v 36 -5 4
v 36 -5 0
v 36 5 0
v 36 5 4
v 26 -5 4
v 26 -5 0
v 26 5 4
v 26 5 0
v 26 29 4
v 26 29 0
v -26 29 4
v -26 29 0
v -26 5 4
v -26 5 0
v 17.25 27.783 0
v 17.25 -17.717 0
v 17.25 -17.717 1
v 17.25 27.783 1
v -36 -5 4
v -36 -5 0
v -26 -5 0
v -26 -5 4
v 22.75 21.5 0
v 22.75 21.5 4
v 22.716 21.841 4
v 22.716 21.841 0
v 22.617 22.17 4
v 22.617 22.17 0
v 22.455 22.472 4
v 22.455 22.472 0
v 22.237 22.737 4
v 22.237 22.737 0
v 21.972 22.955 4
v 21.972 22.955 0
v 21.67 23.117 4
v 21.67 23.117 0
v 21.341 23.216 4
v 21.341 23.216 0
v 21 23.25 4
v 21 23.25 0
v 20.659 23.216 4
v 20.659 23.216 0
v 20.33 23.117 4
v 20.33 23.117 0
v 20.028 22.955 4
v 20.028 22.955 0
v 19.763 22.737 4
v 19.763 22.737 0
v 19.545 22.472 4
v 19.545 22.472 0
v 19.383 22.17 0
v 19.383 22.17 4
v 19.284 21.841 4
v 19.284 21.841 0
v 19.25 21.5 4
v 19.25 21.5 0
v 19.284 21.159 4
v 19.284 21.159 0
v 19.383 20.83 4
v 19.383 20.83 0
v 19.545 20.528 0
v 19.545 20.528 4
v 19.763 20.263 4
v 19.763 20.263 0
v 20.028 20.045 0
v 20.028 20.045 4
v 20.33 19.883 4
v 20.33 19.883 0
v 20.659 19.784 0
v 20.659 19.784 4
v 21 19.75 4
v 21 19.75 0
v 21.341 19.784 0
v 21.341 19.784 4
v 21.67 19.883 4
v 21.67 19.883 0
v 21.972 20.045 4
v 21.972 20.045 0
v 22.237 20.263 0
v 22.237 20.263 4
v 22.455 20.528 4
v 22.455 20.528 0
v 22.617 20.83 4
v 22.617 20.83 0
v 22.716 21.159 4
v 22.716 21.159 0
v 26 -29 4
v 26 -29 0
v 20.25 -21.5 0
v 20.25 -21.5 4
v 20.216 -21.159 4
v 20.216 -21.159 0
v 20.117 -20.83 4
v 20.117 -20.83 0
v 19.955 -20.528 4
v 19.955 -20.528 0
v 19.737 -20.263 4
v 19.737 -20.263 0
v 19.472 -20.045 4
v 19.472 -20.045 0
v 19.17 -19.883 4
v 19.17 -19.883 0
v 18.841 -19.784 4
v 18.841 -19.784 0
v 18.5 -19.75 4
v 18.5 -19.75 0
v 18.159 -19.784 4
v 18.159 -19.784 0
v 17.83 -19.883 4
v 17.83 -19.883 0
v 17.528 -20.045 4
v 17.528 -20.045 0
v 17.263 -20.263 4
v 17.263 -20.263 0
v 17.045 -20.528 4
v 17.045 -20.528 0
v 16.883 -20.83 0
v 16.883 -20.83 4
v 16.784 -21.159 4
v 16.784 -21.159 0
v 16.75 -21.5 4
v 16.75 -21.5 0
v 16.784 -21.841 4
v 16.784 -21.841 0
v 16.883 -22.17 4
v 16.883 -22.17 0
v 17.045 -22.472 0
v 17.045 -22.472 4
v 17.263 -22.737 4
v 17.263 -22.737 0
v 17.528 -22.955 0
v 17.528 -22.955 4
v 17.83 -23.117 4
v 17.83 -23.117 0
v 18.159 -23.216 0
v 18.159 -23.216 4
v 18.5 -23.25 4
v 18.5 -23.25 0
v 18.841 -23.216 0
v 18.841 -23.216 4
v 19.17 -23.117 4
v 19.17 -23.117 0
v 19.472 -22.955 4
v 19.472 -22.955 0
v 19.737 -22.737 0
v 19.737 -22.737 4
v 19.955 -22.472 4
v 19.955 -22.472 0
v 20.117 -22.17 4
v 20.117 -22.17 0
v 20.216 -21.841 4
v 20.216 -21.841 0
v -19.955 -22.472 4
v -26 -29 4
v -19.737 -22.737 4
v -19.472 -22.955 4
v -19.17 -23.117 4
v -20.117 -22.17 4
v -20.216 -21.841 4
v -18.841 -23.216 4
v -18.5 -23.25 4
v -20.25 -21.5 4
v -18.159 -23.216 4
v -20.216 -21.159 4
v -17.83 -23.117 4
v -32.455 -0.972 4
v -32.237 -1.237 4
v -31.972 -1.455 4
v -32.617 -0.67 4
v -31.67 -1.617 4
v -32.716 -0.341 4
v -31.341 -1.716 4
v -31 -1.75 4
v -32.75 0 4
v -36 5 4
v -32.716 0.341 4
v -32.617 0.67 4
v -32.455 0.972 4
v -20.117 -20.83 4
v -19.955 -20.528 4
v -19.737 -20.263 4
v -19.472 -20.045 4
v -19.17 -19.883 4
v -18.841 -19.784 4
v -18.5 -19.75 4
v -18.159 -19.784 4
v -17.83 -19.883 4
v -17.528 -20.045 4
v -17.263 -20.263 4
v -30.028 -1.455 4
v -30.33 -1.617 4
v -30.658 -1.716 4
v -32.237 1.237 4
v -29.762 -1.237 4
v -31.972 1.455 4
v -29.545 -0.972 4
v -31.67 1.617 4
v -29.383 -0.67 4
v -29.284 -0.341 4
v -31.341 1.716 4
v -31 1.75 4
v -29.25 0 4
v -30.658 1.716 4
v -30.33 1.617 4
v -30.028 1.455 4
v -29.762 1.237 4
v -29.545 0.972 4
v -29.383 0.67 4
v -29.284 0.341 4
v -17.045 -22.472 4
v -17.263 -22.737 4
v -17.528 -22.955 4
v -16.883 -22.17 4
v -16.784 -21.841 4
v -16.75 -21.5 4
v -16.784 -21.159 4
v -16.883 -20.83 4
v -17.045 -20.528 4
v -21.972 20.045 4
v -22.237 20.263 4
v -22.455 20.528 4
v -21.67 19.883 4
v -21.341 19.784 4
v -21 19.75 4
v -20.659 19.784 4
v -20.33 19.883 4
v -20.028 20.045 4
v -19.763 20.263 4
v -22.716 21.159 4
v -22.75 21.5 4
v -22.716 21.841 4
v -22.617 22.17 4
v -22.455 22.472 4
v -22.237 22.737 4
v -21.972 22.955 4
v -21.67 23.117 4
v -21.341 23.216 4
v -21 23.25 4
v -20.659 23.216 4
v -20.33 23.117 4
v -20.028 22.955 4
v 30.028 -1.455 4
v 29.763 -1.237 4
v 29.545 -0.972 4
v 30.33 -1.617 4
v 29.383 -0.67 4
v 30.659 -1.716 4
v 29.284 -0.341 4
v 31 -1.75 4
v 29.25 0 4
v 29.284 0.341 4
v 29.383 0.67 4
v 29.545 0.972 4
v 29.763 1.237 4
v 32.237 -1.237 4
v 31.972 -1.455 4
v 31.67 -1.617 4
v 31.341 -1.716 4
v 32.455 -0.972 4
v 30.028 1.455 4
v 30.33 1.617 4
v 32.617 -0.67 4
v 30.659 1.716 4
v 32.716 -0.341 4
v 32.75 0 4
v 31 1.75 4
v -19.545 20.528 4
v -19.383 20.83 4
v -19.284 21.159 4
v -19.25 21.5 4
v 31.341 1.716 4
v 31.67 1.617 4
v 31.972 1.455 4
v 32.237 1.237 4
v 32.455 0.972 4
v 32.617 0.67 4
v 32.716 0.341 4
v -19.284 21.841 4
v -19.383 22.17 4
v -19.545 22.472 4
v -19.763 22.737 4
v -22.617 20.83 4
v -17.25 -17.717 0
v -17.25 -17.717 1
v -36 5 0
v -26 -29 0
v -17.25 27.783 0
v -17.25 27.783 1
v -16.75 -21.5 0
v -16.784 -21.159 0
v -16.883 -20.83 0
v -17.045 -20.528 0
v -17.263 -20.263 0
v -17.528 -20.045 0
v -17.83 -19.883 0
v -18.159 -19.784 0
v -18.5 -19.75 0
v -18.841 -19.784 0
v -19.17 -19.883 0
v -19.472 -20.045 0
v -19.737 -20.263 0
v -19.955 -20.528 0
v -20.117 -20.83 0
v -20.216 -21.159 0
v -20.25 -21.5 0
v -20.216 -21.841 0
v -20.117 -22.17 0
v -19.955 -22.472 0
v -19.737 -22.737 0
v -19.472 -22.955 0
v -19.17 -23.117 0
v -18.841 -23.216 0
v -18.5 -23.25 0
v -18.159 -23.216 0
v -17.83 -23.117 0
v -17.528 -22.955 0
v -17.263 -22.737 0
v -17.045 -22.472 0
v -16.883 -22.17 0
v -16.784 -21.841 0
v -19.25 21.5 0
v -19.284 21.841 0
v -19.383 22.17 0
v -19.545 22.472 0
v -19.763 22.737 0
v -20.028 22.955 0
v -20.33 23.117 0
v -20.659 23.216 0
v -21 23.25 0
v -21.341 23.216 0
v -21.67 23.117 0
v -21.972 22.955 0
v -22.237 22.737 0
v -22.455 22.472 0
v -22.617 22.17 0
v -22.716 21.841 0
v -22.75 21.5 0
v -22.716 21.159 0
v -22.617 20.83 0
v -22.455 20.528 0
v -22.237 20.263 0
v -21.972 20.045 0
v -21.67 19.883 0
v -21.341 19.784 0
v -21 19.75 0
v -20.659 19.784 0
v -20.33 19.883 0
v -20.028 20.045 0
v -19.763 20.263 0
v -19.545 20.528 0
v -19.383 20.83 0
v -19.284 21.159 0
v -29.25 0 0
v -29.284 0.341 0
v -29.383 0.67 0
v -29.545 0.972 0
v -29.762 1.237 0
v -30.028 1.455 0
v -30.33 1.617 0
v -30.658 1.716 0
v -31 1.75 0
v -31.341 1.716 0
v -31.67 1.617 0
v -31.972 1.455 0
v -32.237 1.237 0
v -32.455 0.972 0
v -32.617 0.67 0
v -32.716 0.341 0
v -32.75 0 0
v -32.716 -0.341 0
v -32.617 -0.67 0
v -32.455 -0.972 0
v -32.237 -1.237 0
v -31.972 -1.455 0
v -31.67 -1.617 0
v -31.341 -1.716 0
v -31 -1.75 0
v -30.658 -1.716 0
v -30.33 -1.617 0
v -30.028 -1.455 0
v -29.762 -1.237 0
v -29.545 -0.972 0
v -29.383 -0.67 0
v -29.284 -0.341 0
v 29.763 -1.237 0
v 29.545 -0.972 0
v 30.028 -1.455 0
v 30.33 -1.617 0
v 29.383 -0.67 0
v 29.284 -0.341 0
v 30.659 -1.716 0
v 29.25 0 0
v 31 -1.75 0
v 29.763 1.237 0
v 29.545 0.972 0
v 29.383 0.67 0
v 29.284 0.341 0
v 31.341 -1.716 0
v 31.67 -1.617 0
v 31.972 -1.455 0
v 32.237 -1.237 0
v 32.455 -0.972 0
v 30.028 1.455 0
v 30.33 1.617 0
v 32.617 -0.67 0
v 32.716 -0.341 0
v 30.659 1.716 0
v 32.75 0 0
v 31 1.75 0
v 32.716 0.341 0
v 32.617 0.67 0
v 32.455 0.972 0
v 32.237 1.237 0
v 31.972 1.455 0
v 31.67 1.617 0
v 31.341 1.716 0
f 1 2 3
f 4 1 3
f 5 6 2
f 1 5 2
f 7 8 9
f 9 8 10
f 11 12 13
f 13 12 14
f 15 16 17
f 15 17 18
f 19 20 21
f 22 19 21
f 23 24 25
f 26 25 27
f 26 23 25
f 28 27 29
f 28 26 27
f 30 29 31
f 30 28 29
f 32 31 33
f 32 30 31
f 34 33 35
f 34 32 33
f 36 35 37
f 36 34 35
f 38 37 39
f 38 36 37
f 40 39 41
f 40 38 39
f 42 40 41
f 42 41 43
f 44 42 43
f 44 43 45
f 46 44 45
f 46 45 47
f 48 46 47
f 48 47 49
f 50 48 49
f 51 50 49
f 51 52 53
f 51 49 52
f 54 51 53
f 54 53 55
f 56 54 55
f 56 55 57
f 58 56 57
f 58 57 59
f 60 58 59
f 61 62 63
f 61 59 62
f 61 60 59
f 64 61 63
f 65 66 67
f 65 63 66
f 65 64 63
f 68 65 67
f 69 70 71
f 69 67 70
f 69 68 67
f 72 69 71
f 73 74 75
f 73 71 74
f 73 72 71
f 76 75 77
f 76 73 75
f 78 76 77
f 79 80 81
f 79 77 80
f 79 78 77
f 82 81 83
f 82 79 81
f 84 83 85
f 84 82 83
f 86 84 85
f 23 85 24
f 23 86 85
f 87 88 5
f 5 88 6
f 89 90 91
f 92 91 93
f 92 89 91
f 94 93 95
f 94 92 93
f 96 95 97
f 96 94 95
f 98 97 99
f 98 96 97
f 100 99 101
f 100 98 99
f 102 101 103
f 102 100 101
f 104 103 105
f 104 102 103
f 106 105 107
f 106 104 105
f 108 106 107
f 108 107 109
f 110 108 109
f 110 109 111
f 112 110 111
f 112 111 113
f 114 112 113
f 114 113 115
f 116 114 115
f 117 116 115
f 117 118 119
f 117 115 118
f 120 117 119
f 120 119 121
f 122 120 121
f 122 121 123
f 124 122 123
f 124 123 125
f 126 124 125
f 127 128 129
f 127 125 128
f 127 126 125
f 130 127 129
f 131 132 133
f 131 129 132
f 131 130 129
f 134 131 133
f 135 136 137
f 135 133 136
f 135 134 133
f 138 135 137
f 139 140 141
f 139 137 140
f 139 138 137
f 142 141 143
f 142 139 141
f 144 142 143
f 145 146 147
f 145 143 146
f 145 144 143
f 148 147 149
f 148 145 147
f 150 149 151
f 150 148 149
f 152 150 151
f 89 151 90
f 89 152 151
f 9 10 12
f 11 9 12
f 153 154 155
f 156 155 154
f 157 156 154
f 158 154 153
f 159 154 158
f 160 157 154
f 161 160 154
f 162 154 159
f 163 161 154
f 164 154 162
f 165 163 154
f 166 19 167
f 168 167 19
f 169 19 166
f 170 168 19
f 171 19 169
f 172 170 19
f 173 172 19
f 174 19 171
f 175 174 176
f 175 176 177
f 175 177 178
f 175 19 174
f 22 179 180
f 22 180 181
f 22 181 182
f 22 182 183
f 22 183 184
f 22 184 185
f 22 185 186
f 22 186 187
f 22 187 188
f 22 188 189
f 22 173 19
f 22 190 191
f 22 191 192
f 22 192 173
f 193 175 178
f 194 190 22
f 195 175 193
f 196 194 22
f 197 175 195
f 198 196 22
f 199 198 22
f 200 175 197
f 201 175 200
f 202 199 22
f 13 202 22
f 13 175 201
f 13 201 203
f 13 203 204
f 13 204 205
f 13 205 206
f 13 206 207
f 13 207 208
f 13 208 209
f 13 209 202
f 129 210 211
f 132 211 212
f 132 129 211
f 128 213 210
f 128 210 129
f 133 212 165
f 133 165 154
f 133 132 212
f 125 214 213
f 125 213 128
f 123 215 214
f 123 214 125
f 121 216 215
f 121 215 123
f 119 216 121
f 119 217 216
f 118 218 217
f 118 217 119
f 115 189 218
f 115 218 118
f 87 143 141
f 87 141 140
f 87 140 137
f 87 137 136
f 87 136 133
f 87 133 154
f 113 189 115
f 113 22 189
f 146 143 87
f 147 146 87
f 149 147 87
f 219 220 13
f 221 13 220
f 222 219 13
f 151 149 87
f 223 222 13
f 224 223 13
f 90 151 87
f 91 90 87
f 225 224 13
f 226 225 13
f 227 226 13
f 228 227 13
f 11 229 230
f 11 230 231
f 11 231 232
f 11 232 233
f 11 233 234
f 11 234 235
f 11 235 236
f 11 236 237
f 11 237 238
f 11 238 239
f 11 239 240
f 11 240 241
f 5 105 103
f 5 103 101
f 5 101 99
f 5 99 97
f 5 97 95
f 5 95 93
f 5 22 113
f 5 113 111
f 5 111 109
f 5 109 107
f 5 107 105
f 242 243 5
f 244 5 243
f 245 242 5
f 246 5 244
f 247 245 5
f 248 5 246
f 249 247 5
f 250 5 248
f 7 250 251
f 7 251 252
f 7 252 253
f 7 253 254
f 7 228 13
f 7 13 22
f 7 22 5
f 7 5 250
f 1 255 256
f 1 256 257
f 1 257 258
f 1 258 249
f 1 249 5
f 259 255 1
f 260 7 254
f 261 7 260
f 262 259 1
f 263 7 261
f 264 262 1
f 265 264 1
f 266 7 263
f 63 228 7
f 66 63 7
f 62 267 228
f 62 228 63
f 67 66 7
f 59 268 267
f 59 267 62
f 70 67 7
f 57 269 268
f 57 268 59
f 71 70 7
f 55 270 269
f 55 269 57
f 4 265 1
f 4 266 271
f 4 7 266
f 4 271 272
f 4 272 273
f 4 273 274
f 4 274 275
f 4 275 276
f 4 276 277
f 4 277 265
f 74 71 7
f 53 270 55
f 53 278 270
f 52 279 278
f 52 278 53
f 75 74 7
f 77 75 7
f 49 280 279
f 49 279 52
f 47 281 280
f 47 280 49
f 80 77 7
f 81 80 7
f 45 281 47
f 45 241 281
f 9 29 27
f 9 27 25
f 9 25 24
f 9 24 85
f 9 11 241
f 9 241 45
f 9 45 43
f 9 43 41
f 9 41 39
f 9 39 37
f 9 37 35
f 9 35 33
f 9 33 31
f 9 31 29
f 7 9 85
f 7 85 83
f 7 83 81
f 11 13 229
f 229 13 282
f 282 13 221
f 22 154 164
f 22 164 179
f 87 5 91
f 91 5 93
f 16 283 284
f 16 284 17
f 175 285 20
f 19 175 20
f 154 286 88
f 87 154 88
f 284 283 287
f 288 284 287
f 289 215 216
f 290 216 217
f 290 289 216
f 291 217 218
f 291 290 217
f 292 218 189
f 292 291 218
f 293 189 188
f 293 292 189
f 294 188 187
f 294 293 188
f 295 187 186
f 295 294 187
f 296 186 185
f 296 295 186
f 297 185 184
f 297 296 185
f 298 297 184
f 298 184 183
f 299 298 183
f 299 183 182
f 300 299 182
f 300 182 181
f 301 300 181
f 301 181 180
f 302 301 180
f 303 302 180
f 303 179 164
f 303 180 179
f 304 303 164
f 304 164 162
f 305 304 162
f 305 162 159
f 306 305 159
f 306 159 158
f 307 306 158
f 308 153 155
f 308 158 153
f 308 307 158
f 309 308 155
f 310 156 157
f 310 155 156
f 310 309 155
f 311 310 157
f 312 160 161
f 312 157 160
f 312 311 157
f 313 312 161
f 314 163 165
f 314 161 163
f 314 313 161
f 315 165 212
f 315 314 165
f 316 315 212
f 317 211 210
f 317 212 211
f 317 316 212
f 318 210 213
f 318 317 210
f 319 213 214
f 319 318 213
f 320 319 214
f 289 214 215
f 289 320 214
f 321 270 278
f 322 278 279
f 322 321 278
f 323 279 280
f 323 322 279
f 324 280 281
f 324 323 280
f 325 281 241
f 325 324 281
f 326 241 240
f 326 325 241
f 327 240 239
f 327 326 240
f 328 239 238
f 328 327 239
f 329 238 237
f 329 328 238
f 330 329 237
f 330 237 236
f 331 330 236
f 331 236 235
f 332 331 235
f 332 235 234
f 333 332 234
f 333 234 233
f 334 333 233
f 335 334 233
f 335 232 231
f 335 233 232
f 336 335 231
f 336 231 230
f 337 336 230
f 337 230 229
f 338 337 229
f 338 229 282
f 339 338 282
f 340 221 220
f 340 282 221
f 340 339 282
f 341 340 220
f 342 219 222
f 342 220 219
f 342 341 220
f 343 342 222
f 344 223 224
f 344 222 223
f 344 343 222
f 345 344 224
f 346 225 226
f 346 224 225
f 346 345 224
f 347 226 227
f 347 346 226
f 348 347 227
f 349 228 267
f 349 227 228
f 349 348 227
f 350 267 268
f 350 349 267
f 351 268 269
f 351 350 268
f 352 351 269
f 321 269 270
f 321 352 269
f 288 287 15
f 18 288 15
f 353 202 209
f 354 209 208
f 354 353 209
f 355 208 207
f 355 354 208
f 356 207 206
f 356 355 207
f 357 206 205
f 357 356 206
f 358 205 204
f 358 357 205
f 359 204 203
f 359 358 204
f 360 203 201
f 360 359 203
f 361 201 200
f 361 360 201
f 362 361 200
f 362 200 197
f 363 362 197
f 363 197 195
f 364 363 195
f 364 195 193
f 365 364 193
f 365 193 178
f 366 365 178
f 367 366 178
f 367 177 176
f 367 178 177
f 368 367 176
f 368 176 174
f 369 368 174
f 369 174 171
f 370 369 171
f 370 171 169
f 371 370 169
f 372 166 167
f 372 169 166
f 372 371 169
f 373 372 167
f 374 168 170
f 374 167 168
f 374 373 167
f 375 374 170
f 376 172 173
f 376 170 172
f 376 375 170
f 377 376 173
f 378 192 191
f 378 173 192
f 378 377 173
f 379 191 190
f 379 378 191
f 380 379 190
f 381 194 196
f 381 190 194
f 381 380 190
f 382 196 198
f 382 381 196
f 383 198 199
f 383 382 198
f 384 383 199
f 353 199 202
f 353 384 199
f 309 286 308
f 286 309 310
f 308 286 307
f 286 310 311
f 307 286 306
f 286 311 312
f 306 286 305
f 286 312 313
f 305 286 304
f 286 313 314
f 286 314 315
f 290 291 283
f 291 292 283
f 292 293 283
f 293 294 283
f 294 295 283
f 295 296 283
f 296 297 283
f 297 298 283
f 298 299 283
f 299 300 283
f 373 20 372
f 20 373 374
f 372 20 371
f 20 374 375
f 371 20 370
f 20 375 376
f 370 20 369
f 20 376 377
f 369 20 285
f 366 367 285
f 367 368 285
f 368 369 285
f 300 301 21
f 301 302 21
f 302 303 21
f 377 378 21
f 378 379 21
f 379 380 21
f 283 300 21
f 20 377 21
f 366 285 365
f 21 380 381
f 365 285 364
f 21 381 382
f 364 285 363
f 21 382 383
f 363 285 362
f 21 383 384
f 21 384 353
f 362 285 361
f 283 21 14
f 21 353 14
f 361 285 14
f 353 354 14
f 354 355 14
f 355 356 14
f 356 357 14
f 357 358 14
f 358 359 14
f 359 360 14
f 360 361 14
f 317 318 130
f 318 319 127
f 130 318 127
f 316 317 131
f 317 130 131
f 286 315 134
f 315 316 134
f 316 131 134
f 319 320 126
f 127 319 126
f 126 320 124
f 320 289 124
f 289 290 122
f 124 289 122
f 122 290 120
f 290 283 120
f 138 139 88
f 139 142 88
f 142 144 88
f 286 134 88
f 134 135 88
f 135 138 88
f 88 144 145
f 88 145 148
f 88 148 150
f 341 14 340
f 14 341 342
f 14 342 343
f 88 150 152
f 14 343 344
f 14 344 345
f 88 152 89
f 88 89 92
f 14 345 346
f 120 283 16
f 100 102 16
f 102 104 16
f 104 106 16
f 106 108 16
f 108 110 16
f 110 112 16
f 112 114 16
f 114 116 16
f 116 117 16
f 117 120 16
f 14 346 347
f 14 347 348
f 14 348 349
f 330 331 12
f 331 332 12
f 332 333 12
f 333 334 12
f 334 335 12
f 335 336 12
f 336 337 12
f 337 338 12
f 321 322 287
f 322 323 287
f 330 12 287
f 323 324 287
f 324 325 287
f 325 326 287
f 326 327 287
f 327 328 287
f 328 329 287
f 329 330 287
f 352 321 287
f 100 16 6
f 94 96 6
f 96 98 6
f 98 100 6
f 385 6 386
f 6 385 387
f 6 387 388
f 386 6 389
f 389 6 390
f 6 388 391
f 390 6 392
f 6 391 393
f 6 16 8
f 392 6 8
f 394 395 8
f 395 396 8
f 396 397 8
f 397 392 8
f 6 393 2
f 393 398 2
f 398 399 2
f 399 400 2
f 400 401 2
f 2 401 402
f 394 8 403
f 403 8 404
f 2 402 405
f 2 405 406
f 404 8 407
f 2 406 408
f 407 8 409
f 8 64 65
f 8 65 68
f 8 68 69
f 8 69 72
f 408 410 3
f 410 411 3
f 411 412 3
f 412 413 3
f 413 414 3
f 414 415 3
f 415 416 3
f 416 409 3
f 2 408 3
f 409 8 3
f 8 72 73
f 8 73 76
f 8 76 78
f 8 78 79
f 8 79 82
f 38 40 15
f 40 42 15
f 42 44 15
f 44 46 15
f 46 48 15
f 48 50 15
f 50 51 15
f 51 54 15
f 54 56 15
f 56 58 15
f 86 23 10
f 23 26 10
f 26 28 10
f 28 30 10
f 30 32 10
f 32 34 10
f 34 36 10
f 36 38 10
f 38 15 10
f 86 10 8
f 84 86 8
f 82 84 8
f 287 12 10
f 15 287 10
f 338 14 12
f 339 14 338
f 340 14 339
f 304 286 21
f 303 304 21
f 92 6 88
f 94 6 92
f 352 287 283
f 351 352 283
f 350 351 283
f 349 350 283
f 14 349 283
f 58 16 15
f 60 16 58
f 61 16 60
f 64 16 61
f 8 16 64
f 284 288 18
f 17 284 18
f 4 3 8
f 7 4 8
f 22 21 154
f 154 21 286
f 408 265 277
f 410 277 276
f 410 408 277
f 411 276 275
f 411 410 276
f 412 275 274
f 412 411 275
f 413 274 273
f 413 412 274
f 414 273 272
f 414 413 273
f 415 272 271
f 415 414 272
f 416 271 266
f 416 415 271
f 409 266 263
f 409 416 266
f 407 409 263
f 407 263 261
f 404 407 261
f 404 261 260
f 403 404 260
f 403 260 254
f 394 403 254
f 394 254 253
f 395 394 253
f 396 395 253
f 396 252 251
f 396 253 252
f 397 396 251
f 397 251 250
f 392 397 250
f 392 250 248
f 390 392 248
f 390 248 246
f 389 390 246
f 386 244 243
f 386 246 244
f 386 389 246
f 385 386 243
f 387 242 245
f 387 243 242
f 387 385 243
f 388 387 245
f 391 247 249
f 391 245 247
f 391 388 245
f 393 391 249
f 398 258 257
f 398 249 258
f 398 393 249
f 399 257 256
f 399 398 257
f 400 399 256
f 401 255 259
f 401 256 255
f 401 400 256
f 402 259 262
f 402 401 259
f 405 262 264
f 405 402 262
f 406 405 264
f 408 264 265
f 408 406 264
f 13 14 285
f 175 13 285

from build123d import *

# Parameters (mm, degrees)
F1_DEPTH = 4
F2_W     = 34.5
F2_H     = 45.5
F3_DEPTH = 1
F4_R     = 1.75
F5_DEPTH = 25


with BuildPart() as f1:
    # F0 (on Top) → F1 (new body)
    with BuildSketch(Plane.XY):
        Polygon((26, 5), (26, 29), (-26, 29), (-26, 5), (-36, 5), (-36, -5), (-26, -5), (-26, -29), (26, -29), (26, -5), (36, -5), (36, 5), align=None)
    extrude(amount=F1_DEPTH)

    # F2 (on Top) → F3 (cut)
    with BuildSketch(Plane.XY):
        with Locations((0, 5.032895)):
            Rectangle(F2_W, F2_H)
    extrude(amount=F3_DEPTH, mode=Mode.SUBTRACT)

    # F4 (on Top) → F5 (cut)
    with BuildSketch(Plane.XY):
        with Locations((-18.500006, -21.499975)):
            Circle(F4_R)
        with Locations((18.49998, -21.499971)):
            Circle(F4_R)
        with Locations((-20.999989, 21.499986)):
            Circle(F4_R)
        with Locations((21.000014, 21.499973)):
            Circle(F4_R)
        with Locations((-30.999894, 0)):
            Circle(F4_R)
        with Locations((30.99998, 0)):
            Circle(F4_R)
    extrude(amount=F5_DEPTH, mode=Mode.SUBTRACT)


solid = f1.part
